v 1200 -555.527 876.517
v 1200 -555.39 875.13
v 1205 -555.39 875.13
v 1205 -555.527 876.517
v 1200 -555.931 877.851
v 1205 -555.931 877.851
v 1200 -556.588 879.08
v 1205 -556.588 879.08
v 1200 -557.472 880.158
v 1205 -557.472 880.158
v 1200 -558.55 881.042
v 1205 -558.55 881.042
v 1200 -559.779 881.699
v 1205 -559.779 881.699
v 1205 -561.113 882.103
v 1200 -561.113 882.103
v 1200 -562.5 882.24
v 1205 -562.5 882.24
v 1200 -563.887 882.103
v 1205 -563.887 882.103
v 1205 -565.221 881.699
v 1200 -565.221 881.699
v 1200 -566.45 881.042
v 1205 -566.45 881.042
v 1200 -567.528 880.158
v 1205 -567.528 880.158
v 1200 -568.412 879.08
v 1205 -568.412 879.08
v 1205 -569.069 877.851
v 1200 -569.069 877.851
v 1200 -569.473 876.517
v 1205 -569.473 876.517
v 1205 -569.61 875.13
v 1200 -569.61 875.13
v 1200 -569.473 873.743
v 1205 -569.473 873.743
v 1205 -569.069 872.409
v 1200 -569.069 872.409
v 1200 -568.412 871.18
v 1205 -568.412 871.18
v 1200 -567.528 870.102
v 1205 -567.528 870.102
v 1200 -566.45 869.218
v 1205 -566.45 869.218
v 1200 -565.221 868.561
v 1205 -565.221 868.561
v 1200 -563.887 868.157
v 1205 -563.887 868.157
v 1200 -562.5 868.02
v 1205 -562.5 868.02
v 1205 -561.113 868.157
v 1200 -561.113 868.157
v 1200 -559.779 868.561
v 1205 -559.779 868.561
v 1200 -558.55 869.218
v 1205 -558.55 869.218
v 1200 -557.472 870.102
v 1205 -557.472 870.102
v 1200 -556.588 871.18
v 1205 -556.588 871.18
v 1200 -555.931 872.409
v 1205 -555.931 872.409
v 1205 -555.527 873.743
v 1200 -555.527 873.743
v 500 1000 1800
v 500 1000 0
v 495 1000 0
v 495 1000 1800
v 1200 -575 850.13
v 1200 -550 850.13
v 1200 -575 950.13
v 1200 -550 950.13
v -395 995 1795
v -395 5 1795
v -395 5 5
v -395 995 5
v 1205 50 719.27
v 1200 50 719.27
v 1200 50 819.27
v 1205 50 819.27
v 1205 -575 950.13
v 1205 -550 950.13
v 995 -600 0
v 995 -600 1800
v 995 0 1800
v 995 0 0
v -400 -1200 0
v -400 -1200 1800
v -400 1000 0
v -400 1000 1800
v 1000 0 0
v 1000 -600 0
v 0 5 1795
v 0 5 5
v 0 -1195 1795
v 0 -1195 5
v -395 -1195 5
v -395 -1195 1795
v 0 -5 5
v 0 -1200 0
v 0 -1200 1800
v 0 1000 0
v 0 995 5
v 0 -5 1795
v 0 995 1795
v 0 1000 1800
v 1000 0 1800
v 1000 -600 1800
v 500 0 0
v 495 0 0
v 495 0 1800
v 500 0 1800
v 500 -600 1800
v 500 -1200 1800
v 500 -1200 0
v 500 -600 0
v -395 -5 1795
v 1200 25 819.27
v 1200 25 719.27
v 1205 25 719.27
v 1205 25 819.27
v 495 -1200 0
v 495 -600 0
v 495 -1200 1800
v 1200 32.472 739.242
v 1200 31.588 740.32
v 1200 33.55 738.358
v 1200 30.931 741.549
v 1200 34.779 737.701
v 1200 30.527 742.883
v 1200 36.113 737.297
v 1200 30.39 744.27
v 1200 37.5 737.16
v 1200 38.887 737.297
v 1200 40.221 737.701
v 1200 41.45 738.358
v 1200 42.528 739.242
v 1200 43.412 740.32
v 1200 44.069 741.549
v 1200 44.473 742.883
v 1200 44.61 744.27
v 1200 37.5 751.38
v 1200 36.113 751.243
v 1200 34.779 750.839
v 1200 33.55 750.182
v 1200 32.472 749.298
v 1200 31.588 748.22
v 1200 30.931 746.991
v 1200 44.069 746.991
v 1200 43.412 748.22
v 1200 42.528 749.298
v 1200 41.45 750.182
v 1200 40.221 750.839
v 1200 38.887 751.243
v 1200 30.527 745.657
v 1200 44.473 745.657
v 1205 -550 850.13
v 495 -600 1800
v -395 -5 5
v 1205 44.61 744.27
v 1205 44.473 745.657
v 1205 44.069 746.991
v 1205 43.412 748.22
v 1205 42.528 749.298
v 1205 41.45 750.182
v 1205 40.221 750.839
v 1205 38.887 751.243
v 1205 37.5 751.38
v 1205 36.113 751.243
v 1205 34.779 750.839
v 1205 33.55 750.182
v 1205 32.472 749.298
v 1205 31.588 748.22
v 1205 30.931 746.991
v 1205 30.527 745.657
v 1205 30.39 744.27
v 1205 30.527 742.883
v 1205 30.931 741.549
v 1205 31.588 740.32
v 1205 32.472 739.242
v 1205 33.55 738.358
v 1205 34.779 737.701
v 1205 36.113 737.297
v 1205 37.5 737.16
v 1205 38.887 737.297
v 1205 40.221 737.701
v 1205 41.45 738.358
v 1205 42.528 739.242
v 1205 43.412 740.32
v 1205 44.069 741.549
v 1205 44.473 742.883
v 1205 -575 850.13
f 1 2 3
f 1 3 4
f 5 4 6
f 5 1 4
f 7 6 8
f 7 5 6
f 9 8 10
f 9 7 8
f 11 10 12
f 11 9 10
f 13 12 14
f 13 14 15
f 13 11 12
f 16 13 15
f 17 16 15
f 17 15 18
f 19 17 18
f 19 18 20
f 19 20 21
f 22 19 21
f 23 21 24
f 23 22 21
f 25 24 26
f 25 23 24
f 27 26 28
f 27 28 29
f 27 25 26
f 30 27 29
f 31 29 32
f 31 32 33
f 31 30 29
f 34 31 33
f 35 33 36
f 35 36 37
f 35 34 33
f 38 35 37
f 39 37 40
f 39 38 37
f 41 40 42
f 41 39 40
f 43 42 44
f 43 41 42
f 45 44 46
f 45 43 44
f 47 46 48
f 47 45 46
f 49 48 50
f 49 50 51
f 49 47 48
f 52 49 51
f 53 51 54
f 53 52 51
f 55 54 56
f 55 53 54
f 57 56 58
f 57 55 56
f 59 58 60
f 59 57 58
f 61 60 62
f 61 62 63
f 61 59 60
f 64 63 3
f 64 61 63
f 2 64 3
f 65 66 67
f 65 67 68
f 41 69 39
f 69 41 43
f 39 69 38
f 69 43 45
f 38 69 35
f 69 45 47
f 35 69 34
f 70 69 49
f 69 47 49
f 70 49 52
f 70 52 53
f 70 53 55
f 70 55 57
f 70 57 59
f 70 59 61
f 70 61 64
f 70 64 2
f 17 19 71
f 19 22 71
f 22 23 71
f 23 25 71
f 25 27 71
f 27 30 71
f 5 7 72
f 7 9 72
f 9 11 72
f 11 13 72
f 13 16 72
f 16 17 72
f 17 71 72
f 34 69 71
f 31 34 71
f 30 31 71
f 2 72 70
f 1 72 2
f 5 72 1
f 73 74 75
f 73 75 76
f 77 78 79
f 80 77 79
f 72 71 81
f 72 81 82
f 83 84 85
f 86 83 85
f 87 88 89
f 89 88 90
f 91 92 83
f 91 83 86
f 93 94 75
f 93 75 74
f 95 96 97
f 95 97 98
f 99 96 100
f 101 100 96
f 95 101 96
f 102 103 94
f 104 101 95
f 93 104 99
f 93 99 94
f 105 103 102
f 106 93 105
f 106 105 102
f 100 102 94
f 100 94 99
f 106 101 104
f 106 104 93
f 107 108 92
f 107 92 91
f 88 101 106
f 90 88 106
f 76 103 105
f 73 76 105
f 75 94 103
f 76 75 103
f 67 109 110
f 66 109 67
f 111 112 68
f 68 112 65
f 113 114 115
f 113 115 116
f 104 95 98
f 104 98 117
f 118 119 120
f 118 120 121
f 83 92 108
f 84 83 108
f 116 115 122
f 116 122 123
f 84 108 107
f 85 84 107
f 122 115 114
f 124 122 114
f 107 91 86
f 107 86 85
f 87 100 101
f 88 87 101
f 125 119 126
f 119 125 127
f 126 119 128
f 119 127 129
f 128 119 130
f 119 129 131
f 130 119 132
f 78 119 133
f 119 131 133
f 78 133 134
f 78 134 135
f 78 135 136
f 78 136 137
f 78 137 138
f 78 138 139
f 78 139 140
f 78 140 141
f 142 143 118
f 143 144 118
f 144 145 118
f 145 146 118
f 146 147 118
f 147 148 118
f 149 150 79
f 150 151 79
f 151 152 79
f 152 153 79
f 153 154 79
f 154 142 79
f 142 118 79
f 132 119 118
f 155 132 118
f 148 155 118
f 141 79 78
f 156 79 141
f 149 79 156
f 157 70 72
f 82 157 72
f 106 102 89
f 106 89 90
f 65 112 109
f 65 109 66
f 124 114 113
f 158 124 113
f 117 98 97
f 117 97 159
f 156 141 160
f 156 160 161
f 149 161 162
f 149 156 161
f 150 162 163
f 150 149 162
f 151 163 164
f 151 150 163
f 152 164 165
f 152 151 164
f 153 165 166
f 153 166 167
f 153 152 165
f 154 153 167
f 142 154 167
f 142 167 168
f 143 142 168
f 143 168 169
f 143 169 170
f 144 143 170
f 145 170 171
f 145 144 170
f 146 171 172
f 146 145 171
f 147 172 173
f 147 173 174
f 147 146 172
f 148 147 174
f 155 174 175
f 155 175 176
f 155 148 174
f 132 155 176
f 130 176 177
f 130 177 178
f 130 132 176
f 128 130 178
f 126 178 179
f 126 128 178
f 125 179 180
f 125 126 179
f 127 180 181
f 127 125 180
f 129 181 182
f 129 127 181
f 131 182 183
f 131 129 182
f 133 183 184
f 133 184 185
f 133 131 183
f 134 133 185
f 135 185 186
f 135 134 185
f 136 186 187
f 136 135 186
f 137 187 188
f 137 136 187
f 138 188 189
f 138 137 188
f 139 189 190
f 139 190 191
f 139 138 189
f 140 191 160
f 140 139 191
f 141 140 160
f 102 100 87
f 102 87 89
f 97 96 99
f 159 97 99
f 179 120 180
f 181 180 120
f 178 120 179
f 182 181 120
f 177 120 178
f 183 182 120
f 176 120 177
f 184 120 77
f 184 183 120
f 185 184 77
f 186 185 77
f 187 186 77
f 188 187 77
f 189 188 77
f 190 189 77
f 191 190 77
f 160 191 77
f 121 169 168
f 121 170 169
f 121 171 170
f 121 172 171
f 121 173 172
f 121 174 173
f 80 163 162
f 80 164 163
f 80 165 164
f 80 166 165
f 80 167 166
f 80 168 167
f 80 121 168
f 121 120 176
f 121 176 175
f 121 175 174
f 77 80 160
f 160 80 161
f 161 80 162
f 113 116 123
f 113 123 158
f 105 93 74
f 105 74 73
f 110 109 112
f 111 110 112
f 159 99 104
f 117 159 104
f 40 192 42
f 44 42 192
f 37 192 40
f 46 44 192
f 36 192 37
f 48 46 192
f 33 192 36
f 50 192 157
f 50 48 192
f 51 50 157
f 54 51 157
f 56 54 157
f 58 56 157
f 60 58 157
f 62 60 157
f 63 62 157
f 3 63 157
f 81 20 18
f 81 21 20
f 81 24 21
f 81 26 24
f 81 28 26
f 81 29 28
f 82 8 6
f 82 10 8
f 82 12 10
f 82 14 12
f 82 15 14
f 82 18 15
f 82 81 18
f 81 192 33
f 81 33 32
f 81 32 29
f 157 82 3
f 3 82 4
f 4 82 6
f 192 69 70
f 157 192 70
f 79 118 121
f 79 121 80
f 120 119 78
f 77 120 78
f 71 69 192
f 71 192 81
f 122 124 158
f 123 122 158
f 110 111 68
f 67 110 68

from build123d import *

# Parameters (mm, degrees)
F0_W      = 1200
F0_H      = 1800
F1_DEPTH  = 400
F2_W      = 1000
F2_H      = 1800
F3_DEPTH  = 400
F4_T      = -5
F4_2_T    = -5
F7_W      = 1000
F7_H      = 1800
F8_DEPTH  = 5
F7_W_2    = 600
F10_W     = 600
F10_H     = 1800
F11_DEPTH = 5
F12_W     = 25
F12_H     = 100
F12_R     = 7.11
F13_DEPTH = 5
F15_W     = 25
F15_H     = 100
F15_R     = 7.11
F16_DEPTH = 5


with BuildPart() as f1:
    # F0 (on Right) → F1 (new body)
    with BuildSketch(Plane.YZ):
        with Locations((-600, 900)):
            Rectangle(F0_W, F0_H)
    extrude(amount=-F1_DEPTH)

    # F4
    f4_openings = [f1.faces().sort_by_distance(p)[0] for p in [
        (0, -600, 900),
    ]]
    offset(amount=F4_T, openings=f4_openings)


with BuildPart() as f3:
    # F2 (on Right) → F3 (new body)
    with BuildSketch(Plane.YZ):
        with Locations((500, 900)):
            Rectangle(F2_W, F2_H)
    extrude(amount=-F3_DEPTH)

    # F4#2
    f4_2_openings = [f3.faces().sort_by_distance(p)[0] for p in [
        (0, 500, 900),
    ]]
    offset(amount=F4_2_T, openings=f4_2_openings)


with BuildPart() as f1_1:
    add(f1.part)

    # F5: union F3
    add(f3.part)


with BuildPart() as f8:
    # F7 (on offset) → F8 (new body)
    with BuildSketch(Plane.YZ.offset(500)):
        with Locations((500, 900)):
            Rectangle(F7_W, F7_H)
    extrude(amount=-F8_DEPTH)


with BuildPart() as f8b:
    # F7 (on offset) → F8, piece 2 (new body)
    with BuildSketch(Plane.YZ.offset(500)):
        with Locations((-900, 900)):
            Rectangle(F7_W_2, F7_H)
    extrude(amount=-F8_DEPTH)


with BuildPart() as f11:
    # F10 (on offset) → F11 (new body)
    with BuildSketch(Plane.YZ.offset(1000)):
        with Locations((-300, 900)):
            Rectangle(F10_W, F10_H)
    extrude(amount=-F11_DEPTH)


with BuildPart() as f13:
    # F12 (on face) → F13 (new body)
    with BuildSketch(Plane.YZ.offset(1000)):
        with Locations((-562.5, 900.13)):
            Rectangle(F12_W, F12_H)
        with Locations((-562.5, 875.13)):
            Circle(F12_R, mode=Mode.SUBTRACT)
    extrude(amount=F13_DEPTH)


with BuildPart() as f16:
    # F15 (on offset) → F16 (new body)
    with BuildSketch(Plane.YZ.offset(1200)):
        with Locations((-562.5, 900.13)):
            Rectangle(F15_W, F15_H)
        with Locations((-562.5, 875.13)):
            Circle(F15_R, mode=Mode.SUBTRACT)
    extrude(amount=F16_DEPTH)


with BuildPart() as f16b:
    # F15 (on offset) → F16, piece 2 (new body)
    with BuildSketch(Plane.YZ.offset(1200)):
        with Locations((37.5, 769.27)):
            Rectangle(F15_W, F15_H)
        with Locations((37.5, 744.27)):
            Circle(F15_R, mode=Mode.SUBTRACT)
    extrude(amount=F16_DEPTH)


solid = Compound([f1_1.part, f8.part, f8b.part, f11.part, f16.part, f16b.part])
